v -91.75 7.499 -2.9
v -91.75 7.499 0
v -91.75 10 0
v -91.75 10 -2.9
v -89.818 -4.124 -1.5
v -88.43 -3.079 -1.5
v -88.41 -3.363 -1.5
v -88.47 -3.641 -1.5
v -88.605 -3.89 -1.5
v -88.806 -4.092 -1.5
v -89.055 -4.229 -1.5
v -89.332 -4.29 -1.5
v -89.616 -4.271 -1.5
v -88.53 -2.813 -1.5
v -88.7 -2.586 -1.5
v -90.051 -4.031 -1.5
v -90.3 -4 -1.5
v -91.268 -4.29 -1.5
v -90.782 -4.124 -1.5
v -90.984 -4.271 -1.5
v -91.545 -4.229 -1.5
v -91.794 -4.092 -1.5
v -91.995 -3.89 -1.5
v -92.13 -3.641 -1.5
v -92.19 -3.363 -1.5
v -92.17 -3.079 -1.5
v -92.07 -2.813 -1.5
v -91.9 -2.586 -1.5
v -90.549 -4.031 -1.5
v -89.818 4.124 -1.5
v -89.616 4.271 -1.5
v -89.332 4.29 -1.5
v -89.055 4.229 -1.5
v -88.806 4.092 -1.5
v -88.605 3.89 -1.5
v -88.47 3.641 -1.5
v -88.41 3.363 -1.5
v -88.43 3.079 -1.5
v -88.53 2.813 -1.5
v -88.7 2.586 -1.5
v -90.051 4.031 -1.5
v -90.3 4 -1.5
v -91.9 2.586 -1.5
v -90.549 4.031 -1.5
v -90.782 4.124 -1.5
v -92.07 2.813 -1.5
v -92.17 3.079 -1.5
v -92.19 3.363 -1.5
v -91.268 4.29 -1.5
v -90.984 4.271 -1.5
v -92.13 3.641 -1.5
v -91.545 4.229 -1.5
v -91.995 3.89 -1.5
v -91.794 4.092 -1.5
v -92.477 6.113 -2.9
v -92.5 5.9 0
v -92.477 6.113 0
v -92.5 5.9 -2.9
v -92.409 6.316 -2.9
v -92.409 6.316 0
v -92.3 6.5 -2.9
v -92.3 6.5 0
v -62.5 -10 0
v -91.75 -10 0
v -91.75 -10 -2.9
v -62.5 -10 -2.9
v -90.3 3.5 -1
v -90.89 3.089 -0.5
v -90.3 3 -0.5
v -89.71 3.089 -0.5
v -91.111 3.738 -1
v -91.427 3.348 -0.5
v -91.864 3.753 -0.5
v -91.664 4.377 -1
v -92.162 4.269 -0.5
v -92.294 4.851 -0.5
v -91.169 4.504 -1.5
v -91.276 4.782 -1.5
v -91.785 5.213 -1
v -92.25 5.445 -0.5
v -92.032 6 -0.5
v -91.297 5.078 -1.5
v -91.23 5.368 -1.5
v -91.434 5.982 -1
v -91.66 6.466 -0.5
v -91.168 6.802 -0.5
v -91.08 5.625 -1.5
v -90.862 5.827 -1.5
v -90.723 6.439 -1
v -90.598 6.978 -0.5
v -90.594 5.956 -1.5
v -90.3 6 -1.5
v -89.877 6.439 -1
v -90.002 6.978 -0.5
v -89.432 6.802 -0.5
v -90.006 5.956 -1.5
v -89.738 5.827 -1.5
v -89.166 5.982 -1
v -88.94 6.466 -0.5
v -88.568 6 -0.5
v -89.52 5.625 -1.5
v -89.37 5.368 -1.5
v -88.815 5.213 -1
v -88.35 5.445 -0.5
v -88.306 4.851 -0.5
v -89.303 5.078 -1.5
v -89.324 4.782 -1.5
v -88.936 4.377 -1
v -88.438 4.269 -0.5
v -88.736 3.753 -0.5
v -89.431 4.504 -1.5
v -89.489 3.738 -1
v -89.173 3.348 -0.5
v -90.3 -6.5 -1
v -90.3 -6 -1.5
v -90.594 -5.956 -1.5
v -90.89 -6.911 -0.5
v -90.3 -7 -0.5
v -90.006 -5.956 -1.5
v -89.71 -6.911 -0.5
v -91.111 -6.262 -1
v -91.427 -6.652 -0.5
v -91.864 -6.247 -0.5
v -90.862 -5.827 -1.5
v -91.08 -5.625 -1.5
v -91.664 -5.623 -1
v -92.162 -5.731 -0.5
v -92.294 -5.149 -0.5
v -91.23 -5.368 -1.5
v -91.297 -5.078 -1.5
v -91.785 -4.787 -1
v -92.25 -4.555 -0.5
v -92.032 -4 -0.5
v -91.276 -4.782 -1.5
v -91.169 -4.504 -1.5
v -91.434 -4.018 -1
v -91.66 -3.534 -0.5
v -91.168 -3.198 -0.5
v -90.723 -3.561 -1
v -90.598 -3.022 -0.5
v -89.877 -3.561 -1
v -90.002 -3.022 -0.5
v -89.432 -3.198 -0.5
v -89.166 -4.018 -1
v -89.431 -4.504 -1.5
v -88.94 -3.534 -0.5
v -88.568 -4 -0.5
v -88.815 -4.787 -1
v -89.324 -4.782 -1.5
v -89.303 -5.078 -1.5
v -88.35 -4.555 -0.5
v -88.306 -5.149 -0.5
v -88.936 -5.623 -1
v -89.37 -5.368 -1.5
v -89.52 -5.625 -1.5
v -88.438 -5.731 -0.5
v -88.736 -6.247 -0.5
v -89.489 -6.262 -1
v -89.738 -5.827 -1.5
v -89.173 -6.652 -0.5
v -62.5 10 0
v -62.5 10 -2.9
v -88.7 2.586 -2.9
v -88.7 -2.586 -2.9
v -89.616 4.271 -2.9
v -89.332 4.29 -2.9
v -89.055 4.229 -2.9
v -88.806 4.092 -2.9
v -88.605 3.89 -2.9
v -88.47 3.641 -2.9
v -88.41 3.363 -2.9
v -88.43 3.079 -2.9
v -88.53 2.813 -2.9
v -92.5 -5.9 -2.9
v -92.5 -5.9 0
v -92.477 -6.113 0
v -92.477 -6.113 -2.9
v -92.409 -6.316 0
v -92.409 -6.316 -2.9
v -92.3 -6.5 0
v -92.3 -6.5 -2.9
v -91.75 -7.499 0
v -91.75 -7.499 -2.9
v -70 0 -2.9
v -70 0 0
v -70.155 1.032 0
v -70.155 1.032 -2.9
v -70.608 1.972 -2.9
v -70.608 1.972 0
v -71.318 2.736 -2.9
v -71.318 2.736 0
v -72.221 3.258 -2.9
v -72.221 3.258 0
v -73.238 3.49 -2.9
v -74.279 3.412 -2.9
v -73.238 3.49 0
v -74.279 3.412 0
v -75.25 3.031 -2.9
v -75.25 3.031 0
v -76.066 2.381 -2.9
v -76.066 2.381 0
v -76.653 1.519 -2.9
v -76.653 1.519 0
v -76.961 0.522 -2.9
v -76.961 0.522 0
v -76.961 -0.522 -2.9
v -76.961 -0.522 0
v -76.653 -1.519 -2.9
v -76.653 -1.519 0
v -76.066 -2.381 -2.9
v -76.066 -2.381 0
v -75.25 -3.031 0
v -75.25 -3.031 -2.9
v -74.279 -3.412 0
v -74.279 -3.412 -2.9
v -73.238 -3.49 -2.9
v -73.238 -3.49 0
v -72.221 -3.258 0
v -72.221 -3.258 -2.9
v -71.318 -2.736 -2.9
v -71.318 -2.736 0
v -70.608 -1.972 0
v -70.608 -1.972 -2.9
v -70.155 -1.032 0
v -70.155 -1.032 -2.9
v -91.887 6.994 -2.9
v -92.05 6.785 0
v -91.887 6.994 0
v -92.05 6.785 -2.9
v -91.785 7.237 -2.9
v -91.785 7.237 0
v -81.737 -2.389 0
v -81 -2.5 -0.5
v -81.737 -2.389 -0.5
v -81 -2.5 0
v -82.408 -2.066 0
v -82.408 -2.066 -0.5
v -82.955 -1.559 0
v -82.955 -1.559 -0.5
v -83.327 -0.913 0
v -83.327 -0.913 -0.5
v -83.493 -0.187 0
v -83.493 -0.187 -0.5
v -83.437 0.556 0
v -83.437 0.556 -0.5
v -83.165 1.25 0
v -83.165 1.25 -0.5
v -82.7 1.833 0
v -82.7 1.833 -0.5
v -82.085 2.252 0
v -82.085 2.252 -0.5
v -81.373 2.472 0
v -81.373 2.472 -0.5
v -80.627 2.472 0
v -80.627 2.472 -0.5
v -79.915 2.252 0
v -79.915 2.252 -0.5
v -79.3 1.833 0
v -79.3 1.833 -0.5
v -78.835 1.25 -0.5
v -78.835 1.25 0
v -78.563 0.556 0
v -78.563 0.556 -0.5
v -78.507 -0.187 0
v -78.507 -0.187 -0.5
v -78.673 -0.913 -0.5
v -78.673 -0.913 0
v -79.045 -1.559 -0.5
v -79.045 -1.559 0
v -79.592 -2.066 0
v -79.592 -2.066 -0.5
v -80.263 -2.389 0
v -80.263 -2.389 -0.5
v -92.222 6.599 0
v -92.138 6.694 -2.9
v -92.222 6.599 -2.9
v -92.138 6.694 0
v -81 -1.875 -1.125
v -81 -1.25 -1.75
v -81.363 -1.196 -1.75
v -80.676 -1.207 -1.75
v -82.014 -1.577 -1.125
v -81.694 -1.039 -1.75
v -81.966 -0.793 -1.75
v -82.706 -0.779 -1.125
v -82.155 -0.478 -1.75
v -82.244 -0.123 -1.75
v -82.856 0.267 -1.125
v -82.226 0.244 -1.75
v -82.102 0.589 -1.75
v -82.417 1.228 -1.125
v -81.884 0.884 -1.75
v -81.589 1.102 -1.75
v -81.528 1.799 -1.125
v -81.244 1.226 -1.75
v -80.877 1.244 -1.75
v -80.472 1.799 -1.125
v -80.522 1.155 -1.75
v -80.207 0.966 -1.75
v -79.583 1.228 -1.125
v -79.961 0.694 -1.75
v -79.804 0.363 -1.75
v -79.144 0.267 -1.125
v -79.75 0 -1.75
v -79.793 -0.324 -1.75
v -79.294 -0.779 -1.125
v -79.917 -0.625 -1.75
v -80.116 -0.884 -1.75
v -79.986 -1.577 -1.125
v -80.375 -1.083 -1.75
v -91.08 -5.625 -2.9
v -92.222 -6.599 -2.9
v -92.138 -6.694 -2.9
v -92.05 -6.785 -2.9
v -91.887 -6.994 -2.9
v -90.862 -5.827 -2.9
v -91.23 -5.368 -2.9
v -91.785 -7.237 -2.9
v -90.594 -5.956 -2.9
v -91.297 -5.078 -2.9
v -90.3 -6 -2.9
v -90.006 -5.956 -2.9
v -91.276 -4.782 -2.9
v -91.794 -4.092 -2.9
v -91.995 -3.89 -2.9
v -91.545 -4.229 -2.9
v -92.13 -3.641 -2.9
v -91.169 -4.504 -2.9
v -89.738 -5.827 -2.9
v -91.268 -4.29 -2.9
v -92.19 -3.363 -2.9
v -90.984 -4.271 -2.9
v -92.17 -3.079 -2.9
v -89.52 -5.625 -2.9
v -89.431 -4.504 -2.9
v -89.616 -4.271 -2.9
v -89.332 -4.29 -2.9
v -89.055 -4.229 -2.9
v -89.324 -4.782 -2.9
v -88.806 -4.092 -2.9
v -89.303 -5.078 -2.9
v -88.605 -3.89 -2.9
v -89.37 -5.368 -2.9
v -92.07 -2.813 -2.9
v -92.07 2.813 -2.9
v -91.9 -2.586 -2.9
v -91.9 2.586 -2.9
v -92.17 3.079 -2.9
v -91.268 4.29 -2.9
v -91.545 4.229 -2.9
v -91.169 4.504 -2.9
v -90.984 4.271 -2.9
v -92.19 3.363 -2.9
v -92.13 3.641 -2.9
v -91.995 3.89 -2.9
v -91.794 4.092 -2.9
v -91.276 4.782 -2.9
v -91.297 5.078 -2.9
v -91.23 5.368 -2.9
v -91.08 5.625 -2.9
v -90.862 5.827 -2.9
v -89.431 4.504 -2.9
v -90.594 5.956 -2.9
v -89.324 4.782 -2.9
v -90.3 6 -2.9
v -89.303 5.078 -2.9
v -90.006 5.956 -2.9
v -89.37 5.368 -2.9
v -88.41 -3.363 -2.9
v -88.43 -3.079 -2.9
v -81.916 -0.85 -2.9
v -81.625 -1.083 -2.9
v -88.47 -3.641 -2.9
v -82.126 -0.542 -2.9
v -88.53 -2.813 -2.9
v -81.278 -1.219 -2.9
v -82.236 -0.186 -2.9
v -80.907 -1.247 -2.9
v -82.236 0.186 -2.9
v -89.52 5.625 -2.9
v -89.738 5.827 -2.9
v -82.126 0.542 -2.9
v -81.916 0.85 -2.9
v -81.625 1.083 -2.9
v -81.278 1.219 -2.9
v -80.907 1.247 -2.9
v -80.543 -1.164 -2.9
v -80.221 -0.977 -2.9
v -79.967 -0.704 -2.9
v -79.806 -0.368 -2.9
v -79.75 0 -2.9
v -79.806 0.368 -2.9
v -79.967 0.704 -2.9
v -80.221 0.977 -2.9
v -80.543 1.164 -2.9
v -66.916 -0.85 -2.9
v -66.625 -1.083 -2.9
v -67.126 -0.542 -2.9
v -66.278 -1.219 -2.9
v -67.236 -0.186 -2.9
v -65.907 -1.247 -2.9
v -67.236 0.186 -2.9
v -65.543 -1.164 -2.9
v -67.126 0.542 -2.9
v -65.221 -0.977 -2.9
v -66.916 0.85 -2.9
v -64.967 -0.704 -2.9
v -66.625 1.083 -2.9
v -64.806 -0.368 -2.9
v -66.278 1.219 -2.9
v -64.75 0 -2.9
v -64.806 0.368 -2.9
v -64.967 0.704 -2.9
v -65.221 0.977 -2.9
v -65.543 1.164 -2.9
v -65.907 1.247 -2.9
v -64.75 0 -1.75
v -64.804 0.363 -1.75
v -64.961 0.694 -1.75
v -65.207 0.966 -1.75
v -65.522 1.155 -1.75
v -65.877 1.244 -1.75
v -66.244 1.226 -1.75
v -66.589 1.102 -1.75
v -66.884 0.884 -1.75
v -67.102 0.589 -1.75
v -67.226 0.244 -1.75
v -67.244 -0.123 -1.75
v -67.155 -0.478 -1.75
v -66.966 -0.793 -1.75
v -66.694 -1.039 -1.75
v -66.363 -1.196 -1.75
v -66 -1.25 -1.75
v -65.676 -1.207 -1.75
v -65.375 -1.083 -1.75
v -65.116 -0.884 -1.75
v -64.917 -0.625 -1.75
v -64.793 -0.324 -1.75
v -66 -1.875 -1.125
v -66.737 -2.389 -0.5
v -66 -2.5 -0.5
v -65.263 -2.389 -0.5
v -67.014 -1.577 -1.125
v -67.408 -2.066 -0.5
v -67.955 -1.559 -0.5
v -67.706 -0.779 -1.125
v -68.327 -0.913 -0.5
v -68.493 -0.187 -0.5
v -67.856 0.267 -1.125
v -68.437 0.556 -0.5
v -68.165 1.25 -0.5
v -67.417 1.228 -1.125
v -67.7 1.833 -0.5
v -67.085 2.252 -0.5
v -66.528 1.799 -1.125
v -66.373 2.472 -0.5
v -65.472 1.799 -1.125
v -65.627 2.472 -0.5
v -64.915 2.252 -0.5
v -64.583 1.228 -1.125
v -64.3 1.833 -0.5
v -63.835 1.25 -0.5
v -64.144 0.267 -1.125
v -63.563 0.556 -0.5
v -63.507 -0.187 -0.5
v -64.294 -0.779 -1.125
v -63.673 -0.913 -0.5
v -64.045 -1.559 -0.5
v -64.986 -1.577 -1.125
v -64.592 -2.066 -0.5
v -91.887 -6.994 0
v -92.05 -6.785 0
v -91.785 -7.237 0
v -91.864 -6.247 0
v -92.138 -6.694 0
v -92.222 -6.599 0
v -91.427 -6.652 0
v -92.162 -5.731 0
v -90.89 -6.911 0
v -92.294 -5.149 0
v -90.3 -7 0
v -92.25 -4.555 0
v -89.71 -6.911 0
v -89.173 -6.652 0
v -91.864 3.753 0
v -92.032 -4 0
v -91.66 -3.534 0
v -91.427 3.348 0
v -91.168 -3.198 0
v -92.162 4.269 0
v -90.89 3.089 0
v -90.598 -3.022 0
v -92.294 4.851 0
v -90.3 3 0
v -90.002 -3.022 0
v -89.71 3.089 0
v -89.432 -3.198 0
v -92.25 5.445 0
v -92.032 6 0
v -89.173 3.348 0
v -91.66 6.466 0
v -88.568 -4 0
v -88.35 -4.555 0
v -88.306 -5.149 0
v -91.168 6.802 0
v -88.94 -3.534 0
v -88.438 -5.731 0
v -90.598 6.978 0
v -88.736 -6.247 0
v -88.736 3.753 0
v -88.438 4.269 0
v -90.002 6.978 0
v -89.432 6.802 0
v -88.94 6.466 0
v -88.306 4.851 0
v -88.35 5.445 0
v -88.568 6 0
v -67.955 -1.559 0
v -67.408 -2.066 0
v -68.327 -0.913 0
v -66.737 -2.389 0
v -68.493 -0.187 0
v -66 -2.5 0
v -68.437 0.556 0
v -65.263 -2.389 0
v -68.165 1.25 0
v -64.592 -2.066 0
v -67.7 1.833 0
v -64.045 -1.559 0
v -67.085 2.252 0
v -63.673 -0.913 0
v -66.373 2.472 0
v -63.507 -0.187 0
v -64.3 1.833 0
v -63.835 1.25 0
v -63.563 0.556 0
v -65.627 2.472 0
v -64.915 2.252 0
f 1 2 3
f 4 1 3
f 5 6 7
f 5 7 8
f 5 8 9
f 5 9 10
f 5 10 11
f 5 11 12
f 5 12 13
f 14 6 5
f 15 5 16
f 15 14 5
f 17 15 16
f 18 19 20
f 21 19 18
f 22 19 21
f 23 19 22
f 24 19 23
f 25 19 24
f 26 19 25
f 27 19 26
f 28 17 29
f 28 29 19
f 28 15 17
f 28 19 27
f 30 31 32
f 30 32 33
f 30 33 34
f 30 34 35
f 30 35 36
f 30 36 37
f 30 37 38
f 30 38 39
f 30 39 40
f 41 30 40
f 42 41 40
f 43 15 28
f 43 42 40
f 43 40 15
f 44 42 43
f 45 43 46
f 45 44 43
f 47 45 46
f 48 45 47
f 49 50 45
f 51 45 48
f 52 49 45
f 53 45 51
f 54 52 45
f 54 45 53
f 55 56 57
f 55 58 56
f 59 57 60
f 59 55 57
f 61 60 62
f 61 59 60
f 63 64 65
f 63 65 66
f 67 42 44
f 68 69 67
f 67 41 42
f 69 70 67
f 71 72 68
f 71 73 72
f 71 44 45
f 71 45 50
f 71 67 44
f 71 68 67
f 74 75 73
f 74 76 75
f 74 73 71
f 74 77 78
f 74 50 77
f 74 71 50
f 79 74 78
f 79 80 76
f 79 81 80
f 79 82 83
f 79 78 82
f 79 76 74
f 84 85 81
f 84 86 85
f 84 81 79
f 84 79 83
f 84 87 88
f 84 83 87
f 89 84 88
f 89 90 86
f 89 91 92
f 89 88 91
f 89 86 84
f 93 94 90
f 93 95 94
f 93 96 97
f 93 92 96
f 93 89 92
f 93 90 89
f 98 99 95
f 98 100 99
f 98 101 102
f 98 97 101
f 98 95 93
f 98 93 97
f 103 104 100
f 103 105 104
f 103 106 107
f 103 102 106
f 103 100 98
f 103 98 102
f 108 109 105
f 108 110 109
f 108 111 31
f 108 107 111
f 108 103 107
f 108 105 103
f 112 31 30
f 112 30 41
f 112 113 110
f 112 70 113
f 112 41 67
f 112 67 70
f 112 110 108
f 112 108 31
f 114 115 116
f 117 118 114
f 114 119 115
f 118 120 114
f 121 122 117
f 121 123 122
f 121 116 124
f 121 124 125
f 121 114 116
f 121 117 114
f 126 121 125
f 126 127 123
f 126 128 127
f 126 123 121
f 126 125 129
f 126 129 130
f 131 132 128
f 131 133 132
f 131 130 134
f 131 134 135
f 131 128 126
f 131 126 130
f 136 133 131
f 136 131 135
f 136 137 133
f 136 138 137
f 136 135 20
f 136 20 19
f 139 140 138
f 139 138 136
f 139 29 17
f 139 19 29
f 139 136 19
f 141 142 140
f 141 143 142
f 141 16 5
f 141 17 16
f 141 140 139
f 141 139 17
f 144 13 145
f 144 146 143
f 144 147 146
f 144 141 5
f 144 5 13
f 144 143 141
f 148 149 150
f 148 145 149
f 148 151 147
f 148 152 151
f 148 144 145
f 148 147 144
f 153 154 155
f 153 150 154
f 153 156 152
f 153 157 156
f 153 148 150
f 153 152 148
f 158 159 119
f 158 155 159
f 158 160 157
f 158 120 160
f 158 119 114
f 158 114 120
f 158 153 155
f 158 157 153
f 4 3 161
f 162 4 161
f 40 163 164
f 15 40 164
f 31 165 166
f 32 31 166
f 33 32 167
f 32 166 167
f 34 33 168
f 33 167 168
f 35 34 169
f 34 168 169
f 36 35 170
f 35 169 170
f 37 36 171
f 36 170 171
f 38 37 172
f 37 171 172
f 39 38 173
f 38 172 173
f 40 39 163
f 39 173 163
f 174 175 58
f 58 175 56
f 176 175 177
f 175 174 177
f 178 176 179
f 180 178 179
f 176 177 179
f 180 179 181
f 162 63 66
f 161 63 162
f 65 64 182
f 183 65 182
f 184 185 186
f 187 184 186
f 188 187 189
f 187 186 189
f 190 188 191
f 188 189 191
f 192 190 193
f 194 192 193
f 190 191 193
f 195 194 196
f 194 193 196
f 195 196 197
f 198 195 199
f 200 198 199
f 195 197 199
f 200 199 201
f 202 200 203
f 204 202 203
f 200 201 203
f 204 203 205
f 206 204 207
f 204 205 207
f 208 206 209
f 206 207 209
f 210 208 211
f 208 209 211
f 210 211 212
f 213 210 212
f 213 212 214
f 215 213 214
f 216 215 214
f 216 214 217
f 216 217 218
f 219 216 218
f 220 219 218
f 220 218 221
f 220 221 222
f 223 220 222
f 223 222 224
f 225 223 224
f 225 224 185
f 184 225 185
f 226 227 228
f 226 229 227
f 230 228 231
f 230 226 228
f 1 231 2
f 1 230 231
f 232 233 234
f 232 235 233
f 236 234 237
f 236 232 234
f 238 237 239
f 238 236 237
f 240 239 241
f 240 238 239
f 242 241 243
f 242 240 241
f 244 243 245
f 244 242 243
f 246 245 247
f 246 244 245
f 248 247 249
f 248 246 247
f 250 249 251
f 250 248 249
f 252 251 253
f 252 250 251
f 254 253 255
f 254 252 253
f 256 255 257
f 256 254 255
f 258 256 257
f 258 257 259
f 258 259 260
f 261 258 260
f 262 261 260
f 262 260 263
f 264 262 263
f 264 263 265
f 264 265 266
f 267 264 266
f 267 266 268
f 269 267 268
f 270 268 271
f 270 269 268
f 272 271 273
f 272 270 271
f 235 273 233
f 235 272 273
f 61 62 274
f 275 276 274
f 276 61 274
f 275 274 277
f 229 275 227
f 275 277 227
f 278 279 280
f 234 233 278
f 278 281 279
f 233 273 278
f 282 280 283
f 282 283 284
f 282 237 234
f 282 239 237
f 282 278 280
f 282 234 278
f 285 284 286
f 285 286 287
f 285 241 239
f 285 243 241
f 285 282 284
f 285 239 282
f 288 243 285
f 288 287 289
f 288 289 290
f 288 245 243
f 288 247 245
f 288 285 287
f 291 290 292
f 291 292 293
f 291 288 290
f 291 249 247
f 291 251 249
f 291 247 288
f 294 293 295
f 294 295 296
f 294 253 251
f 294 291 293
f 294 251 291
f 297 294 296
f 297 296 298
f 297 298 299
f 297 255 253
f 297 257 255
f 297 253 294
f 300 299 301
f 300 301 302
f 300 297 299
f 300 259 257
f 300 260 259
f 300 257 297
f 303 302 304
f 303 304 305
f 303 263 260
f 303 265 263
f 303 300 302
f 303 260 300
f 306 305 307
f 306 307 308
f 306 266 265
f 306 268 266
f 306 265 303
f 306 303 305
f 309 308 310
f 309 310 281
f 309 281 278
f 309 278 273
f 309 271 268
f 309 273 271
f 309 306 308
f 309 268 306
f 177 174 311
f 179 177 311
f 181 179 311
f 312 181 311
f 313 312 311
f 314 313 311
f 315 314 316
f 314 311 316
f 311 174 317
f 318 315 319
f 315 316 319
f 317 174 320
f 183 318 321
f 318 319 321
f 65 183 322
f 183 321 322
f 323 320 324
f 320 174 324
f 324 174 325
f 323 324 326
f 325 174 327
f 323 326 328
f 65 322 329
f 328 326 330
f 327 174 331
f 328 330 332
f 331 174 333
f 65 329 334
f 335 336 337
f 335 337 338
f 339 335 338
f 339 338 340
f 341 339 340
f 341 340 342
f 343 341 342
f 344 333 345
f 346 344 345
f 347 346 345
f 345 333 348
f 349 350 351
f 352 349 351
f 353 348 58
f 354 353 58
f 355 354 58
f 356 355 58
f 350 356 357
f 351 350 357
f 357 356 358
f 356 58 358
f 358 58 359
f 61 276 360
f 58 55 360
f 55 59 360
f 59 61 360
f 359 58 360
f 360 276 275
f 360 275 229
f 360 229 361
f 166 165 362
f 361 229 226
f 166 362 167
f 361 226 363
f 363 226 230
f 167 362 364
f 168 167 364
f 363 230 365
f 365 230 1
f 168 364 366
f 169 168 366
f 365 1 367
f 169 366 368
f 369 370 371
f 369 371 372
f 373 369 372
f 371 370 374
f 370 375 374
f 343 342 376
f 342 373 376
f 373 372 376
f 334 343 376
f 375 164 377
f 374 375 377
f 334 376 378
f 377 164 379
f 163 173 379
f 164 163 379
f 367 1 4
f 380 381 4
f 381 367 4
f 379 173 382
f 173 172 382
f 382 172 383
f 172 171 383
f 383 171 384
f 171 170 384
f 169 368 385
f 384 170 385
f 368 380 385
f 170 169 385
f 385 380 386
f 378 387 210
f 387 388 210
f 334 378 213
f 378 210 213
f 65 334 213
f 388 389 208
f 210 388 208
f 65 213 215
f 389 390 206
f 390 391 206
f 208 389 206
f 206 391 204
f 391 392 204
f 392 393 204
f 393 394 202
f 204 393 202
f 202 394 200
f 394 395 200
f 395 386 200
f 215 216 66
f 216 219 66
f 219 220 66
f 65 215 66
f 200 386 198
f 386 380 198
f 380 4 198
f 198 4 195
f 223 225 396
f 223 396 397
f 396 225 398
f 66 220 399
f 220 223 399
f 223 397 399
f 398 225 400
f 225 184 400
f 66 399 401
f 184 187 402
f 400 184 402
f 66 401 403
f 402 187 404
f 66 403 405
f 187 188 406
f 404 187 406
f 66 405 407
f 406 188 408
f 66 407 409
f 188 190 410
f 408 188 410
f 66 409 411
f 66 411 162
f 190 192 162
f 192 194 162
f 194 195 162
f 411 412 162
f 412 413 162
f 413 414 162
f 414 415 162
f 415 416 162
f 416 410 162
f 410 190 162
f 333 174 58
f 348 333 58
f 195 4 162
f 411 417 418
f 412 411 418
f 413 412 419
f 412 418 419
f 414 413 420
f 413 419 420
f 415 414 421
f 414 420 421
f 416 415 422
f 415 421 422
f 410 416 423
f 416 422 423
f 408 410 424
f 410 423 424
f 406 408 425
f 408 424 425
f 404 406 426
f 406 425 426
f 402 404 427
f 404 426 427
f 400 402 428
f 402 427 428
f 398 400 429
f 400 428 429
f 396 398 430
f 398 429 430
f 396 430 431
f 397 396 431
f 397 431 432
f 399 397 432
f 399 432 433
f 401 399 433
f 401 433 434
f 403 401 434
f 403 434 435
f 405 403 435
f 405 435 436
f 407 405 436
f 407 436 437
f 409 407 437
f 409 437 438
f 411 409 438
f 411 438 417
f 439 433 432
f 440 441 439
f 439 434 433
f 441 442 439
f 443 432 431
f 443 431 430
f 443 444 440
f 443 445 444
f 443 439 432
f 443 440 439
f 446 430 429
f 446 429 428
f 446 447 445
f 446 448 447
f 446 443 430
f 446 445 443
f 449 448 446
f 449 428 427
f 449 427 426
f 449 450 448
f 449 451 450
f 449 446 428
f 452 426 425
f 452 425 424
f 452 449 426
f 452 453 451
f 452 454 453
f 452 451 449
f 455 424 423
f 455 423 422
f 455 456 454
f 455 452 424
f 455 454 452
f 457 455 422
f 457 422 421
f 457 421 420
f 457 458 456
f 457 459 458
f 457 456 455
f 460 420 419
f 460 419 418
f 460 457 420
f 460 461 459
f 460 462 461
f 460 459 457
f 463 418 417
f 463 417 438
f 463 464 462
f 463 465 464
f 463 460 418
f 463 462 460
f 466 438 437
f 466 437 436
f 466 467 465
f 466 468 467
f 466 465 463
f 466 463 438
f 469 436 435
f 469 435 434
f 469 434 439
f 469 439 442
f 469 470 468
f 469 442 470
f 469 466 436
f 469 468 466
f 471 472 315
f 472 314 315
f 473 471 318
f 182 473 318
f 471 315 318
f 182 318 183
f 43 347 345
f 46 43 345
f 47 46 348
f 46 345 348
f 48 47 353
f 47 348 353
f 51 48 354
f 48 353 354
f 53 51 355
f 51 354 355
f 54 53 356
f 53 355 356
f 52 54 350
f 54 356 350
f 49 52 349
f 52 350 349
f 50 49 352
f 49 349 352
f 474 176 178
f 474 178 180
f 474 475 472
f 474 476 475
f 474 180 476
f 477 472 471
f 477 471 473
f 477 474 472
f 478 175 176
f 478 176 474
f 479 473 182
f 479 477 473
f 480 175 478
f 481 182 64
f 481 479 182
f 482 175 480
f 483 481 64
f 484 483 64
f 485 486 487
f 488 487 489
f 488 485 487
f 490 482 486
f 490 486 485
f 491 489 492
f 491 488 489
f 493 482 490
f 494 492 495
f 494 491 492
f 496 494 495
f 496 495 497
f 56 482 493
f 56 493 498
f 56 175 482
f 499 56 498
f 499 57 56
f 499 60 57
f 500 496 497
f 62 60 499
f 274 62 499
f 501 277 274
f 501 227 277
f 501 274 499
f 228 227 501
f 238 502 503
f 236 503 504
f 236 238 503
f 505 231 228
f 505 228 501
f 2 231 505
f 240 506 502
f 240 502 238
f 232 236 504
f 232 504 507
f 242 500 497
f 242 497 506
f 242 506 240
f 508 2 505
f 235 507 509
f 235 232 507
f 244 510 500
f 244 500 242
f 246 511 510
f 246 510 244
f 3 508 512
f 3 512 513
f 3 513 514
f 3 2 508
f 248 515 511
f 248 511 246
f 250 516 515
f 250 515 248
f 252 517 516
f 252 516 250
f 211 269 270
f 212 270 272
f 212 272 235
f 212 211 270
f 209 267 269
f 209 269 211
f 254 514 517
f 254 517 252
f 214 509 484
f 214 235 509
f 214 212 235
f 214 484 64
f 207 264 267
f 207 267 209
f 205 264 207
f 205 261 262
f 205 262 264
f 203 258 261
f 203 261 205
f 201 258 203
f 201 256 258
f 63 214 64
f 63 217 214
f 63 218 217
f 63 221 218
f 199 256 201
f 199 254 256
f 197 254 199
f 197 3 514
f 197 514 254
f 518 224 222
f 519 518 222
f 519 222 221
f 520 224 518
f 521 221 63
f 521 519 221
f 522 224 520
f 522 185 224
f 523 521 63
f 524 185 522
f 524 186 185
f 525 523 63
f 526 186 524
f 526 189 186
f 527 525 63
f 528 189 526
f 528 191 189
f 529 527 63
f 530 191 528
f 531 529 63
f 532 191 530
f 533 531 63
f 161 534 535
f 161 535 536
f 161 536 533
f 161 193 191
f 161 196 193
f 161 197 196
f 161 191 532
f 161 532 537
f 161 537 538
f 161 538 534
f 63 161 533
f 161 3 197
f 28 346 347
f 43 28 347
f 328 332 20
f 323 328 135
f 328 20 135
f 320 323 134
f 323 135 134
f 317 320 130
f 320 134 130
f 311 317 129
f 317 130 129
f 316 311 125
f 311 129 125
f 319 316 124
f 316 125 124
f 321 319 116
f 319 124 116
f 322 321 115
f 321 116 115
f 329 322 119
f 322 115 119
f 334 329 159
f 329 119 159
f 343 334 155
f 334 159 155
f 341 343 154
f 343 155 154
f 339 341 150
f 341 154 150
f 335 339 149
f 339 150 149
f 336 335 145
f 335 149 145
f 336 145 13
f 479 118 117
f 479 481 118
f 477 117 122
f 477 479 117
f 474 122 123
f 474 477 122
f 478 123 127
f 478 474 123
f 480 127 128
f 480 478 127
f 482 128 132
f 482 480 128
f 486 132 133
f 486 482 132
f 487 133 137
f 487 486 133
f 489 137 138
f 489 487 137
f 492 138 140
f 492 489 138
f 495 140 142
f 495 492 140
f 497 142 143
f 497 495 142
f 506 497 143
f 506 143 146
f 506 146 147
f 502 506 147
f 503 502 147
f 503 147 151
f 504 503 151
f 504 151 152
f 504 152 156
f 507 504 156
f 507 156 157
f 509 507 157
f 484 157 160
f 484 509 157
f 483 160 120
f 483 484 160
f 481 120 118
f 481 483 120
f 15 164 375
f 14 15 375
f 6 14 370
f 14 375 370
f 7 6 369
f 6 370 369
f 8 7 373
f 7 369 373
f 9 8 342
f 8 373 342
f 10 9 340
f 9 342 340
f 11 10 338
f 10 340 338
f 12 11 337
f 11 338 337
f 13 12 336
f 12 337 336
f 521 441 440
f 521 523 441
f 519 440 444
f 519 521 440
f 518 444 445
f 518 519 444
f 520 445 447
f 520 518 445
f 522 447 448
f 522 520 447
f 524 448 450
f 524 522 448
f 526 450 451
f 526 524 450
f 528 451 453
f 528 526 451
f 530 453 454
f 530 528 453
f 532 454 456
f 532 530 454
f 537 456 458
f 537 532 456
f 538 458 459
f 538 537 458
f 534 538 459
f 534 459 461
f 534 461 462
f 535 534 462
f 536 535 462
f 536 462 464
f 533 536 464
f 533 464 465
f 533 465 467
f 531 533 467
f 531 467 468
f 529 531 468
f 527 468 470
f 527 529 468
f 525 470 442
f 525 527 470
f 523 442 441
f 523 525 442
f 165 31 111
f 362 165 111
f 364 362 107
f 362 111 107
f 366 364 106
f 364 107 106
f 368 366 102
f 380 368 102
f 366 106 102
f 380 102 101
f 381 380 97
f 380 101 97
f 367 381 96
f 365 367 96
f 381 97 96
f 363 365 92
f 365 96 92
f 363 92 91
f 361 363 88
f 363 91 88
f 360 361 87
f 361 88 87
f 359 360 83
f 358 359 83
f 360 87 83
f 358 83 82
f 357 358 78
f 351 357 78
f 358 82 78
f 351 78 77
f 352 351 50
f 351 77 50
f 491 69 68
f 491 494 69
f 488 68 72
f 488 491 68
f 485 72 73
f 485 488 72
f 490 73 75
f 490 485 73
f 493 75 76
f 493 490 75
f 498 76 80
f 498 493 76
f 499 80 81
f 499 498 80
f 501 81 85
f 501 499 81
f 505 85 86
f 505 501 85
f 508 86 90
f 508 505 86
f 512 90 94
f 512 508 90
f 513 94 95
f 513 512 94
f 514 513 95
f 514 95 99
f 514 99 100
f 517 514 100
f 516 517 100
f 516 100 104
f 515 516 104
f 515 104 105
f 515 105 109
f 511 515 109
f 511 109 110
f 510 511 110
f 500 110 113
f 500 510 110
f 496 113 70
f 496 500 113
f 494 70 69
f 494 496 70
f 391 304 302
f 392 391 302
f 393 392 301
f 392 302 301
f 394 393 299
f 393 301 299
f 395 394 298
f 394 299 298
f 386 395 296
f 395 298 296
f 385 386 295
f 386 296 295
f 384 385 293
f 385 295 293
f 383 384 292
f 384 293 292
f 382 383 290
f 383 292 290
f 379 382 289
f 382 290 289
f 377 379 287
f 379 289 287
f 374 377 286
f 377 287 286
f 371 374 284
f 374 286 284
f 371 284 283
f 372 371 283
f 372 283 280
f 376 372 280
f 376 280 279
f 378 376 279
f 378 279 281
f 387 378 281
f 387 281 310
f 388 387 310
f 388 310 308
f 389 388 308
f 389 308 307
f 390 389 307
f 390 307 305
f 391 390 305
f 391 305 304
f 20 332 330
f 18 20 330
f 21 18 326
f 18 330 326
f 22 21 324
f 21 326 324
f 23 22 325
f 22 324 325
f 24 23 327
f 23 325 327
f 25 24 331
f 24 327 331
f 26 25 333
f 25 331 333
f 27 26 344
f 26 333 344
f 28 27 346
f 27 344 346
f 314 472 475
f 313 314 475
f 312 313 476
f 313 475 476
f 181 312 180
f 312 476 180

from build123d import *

# Parameters (mm, degrees)
SKETCH1_W                                      = 185
SKETCH1_H                                      = 20
BASE_SHAPE_DEPTH                               = 2.9
MOTOR_CUTOUTS_REACH                            = 95.084
SKETCH2_R                                      = 1.25
SKETCH2_R_2                                    = 3.5
SKETCH2_R_3                                    = 5
MOTOR_M2_5_COUNTERSUNKS_AT_2_COUNT             = 2
MOTOR_M2_5_COUNTERSUNKS_AT_2_PITCH             = 15
MOTOR_M2_5_COUNTERSUNKS_AT_3_COUNT             = 2
MOTOR_M2_5_COUNTERSUNKS_AT_3_PITCH             = 147.666008275
MOTOR_M2_5_COUNTERSUNKS_AT_4_COUNT             = 2
MOTOR_M2_5_COUNTERSUNKS_AT_4_PITCH             = 161.651631603
MOTOR_M2_5_COUNTERSUNKS_AT_5_COUNT             = 2
MOTOR_M2_5_COUNTERSUNKS_AT_5_PITCH             = 147.666008275
MOTOR_M2_5_COUNTERSUNKS_AT_6_COUNT             = 2
MOTOR_M2_5_COUNTERSUNKS_AT_6_PITCH             = 161.651631603
PCB_SLOT_DEPTH                                 = 0.775
END_PLATE_HOLES_REACH                          = 95.084
SKETCH6_R                                      = 1
CSK_FOR_M2_FLAT_HEAD_MACHINE_SCREW3_AT_2_COUNT = 2
CSK_FOR_M2_FLAT_HEAD_MACHINE_SCREW3_AT_2_PITCH = 10
CSK_FOR_M2_FLAT_HEAD_MACHINE_SCREW3_AT_3_COUNT = 2
CSK_FOR_M2_FLAT_HEAD_MACHINE_SCREW3_AT_3_PITCH = 180.6
CSK_FOR_M2_FLAT_HEAD_MACHINE_SCREW3_AT_4_COUNT = 2
CSK_FOR_M2_FLAT_HEAD_MACHINE_SCREW3_AT_4_PITCH = 180.876643047
TAP_SLOTS_DEPTH                                = 1.4
CUT_EXTRUDE3_REACH                             = 95.084
FILLET1_R                                      = 1
CUT_EXTRUDE4_REACH                             = 95.084
SKETCH14_W                                     = 155
SKETCH14_H                                     = 20


with BuildPart() as part:
    # Sketch1 → Base shape (new body)
    with BuildSketch(Plane.XY):
        Rectangle(SKETCH1_W, SKETCH1_H)
    extrude(amount=-BASE_SHAPE_DEPTH)

    # Sketch2 → Motor cutouts (cut, up to next)
    with BuildSketch(Plane.XY, mode=Mode.PRIVATE) as motor_cutouts_sk1:
        with Locations((-81, 0)):
            Circle(SKETCH2_R)
    motor_cutouts_tool1 = extrude(motor_cutouts_sk1.sketch, amount=-MOTOR_CUTOUTS_REACH, mode=Mode.PRIVATE) & part.part
    # Sketch2 → Motor cutouts (cut, up to next)
    with BuildSketch(Plane.XY, mode=Mode.PRIVATE) as motor_cutouts_sk2:
        with Locations((-66, 0)):
            Circle(SKETCH2_R)
    motor_cutouts_tool2 = extrude(motor_cutouts_sk2.sketch, amount=-MOTOR_CUTOUTS_REACH, mode=Mode.PRIVATE) & part.part
    # Sketch2 → Motor cutouts (cut, up to next)
    with BuildSketch(Plane.XY, mode=Mode.PRIVATE) as motor_cutouts_sk3:
        with Locations((-73.5, 0)):
            Circle(SKETCH2_R_2)
    motor_cutouts_tool3 = extrude(motor_cutouts_sk3.sketch, amount=-MOTOR_CUTOUTS_REACH, mode=Mode.PRIVATE) & part.part
    # Sketch2 → Motor cutouts (cut, up to next)
    with BuildSketch(Plane.XY, mode=Mode.PRIVATE) as motor_cutouts_sk4:
        with Locations((73.5, 0)):
            Circle(SKETCH2_R_3)
    motor_cutouts_tool4 = extrude(motor_cutouts_sk4.sketch, amount=-MOTOR_CUTOUTS_REACH, mode=Mode.PRIVATE) & part.part
    # Sketch2 → Motor cutouts (cut, up to next)
    with BuildSketch(Plane.XY, mode=Mode.PRIVATE) as motor_cutouts_sk5:
        with Locations((66.5, 7)):
            Circle(SKETCH2_R)
    motor_cutouts_tool5 = extrude(motor_cutouts_sk5.sketch, amount=-MOTOR_CUTOUTS_REACH, mode=Mode.PRIVATE) & part.part
    # Sketch2 → Motor cutouts (cut, up to next)
    with BuildSketch(Plane.XY, mode=Mode.PRIVATE) as motor_cutouts_sk6:
        with Locations((80.5, 7)):
            Circle(SKETCH2_R)
    motor_cutouts_tool6 = extrude(motor_cutouts_sk6.sketch, amount=-MOTOR_CUTOUTS_REACH, mode=Mode.PRIVATE) & part.part
    # Sketch2 → Motor cutouts (cut, up to next)
    with BuildSketch(Plane.XY, mode=Mode.PRIVATE) as motor_cutouts_sk7:
        with Locations((80.5, -7)):
            Circle(SKETCH2_R)
    motor_cutouts_tool7 = extrude(motor_cutouts_sk7.sketch, amount=-MOTOR_CUTOUTS_REACH, mode=Mode.PRIVATE) & part.part
    # Sketch2 → Motor cutouts (cut, up to next)
    with BuildSketch(Plane.XY, mode=Mode.PRIVATE) as motor_cutouts_sk8:
        with Locations((66.5, -7)):
            Circle(SKETCH2_R)
    motor_cutouts_tool8 = extrude(motor_cutouts_sk8.sketch, amount=-MOTOR_CUTOUTS_REACH, mode=Mode.PRIVATE) & part.part
    add(motor_cutouts_tool1.solids().sort_by_distance((-81, 0, 0))[0], mode=Mode.SUBTRACT)
    add(motor_cutouts_tool2.solids().sort_by_distance((-66, 0, 0))[0], mode=Mode.SUBTRACT)
    add(motor_cutouts_tool3.solids().sort_by_distance((-73.5, 0, 0))[0], mode=Mode.SUBTRACT)
    add(motor_cutouts_tool4.solids().sort_by_distance((73.5, 0, 0))[0], mode=Mode.SUBTRACT)
    add(motor_cutouts_tool5.solids().sort_by_distance((66.5, 7, 0))[0], mode=Mode.SUBTRACT)
    add(motor_cutouts_tool6.solids().sort_by_distance((80.5, 7, 0))[0], mode=Mode.SUBTRACT)
    add(motor_cutouts_tool7.solids().sort_by_distance((80.5, -7, 0))[0], mode=Mode.SUBTRACT)
    add(motor_cutouts_tool8.solids().sort_by_distance((66.5, -7, 0))[0], mode=Mode.SUBTRACT)

    # Sketch4 → Motor M2.5 countersunks (revolve, cut)
    with BuildSketch(Plane(origin=(-81, 0, 0), x_dir=(0, -1, 0), z_dir=(1, 0, 0))):
        Polygon((0, 0), (0, 2.9), (1.25, 2.9), (1.25, 1.75), (2.5, 0.5), (2.5, 0), align=None)
    motor_m2_5_countersunks = revolve(axis=Axis((-81, 0, 6.35), (0, 0, -1)), mode=Mode.SUBTRACT)

    # Motor M2.5 countersunks at 2: Motor M2.5 countersunks ×2
    with Locations(*[(i * MOTOR_M2_5_COUNTERSUNKS_AT_2_PITCH, 0, 0) for i in range(1, MOTOR_M2_5_COUNTERSUNKS_AT_2_COUNT)]):
        add(motor_m2_5_countersunks, mode=Mode.SUBTRACT)

    # Motor M2.5 countersunks at 3: Motor M2.5 countersunks ×2
    with Locations(*[Vector(0.9988757854473691, 0.047404274563603965, 0) * (i * MOTOR_M2_5_COUNTERSUNKS_AT_3_PITCH) for i in range(1, MOTOR_M2_5_COUNTERSUNKS_AT_3_COUNT)]):
        add(motor_m2_5_countersunks, mode=Mode.SUBTRACT)

    # Motor M2.5 countersunks at 4: Motor M2.5 countersunks ×2
    with Locations(*[Vector(0.9990619853213468, 0.043302996267798335, 0) * (i * MOTOR_M2_5_COUNTERSUNKS_AT_4_PITCH) for i in range(1, MOTOR_M2_5_COUNTERSUNKS_AT_4_COUNT)]):
        add(motor_m2_5_countersunks, mode=Mode.SUBTRACT)

    # Motor M2.5 countersunks at 5: Motor M2.5 countersunks ×2
    with Locations(*[Vector(0.9988757854473691, -0.04740427456360395, 0) * (i * MOTOR_M2_5_COUNTERSUNKS_AT_5_PITCH) for i in range(1, MOTOR_M2_5_COUNTERSUNKS_AT_5_COUNT)]):
        add(motor_m2_5_countersunks, mode=Mode.SUBTRACT)

    # Motor M2.5 countersunks at 6: Motor M2.5 countersunks ×2
    with Locations(*[Vector(0.9990619853213468, -0.0433029962677983, 0) * (i * MOTOR_M2_5_COUNTERSUNKS_AT_6_PITCH) for i in range(1, MOTOR_M2_5_COUNTERSUNKS_AT_6_COUNT)]):
        add(motor_m2_5_countersunks, mode=Mode.SUBTRACT)

    # Sketch5 → PCB slot (cut)
    with BuildSketch(Plane(origin=(0, 0, -2.9), x_dir=(-1, 0, 0), z_dir=(0, 0, -1))):
        with BuildLine():
            Line((-60, -6), (60, -6))
            ThreePointArc((60, -6), (61, -7), (60, -8))
            Line((60, -8), (-60, -8))
            ThreePointArc((-60, -8), (-61, -7), (-60, -6))
        make_face()
    extrude(amount=-PCB_SLOT_DEPTH, mode=Mode.SUBTRACT)

    # Sketch6 → End plate holes (cut, up to next)
    with BuildSketch(Plane.XY, mode=Mode.PRIVATE) as end_plate_holes_sk1:
        with Locations((90.3, 5)):
            Circle(SKETCH6_R)
    end_plate_holes_tool1 = extrude(end_plate_holes_sk1.sketch, amount=-END_PLATE_HOLES_REACH, mode=Mode.PRIVATE) & part.part
    # Sketch6 → End plate holes (cut, up to next)
    with BuildSketch(Plane.XY, mode=Mode.PRIVATE) as end_plate_holes_sk2:
        with Locations((90.3, -5)):
            Circle(SKETCH6_R)
    end_plate_holes_tool2 = extrude(end_plate_holes_sk2.sketch, amount=-END_PLATE_HOLES_REACH, mode=Mode.PRIVATE) & part.part
    # Sketch6 → End plate holes (cut, up to next)
    with BuildSketch(Plane.XY, mode=Mode.PRIVATE) as end_plate_holes_sk3:
        with Locations((-90.3, -5)):
            Circle(SKETCH6_R)
    end_plate_holes_tool3 = extrude(end_plate_holes_sk3.sketch, amount=-END_PLATE_HOLES_REACH, mode=Mode.PRIVATE) & part.part
    # Sketch6 → End plate holes (cut, up to next)
    with BuildSketch(Plane.XY, mode=Mode.PRIVATE) as end_plate_holes_sk4:
        with Locations((-90.3, 5)):
            Circle(SKETCH6_R)
    end_plate_holes_tool4 = extrude(end_plate_holes_sk4.sketch, amount=-END_PLATE_HOLES_REACH, mode=Mode.PRIVATE) & part.part
    add(end_plate_holes_tool1.solids().sort_by_distance((90.3, 5, 0))[0], mode=Mode.SUBTRACT)
    add(end_plate_holes_tool2.solids().sort_by_distance((90.3, -5, 0))[0], mode=Mode.SUBTRACT)
    add(end_plate_holes_tool3.solids().sort_by_distance((-90.3, -5, 0))[0], mode=Mode.SUBTRACT)
    add(end_plate_holes_tool4.solids().sort_by_distance((-90.3, 5, 0))[0], mode=Mode.SUBTRACT)

    # Sketch9 → CSK for M2 Flat Head Machine Screw3 (revolve, cut)
    with BuildSketch(Plane(origin=(90.3, 5, 0), x_dir=(0, -1, 0), z_dir=(1, 0, 0))):
        Polygon((0, 0), (0, 2.9), (1, 2.9), (1, 1.5), (2, 0.5), (2, 0), align=None)
    csk_for_m2_flat_head_machine_screw3 = revolve(axis=Axis((90.3, 5, 6.35), (0, 0, -1)), mode=Mode.SUBTRACT)

    # CSK for M2 Flat Head Machine Screw3 at 2: CSK for M2 Flat Head Machine Screw3 ×2
    with Locations(*[(0, -i * CSK_FOR_M2_FLAT_HEAD_MACHINE_SCREW3_AT_2_PITCH, 0) for i in range(1, CSK_FOR_M2_FLAT_HEAD_MACHINE_SCREW3_AT_2_COUNT)]):
        add(csk_for_m2_flat_head_machine_screw3, mode=Mode.SUBTRACT)

    # CSK for M2 Flat Head Machine Screw3 at 3: CSK for M2 Flat Head Machine Screw3 ×2
    with Locations(*[(-i * CSK_FOR_M2_FLAT_HEAD_MACHINE_SCREW3_AT_3_PITCH, 0, 0) for i in range(1, CSK_FOR_M2_FLAT_HEAD_MACHINE_SCREW3_AT_3_COUNT)]):
        add(csk_for_m2_flat_head_machine_screw3, mode=Mode.SUBTRACT)

    # CSK for M2 Flat Head Machine Screw3 at 4: CSK for M2 Flat Head Machine Screw3 ×2
    with Locations(*[Vector(-0.9984705430039356, -0.055286298062233535, 0) * (i * CSK_FOR_M2_FLAT_HEAD_MACHINE_SCREW3_AT_4_PITCH) for i in range(1, CSK_FOR_M2_FLAT_HEAD_MACHINE_SCREW3_AT_4_COUNT)]):
        add(csk_for_m2_flat_head_machine_screw3, mode=Mode.SUBTRACT)

    # Sketch12 → Tap slots (cut)
    with BuildSketch(Plane(origin=(0, 0, -2.9), x_dir=(-1, 0, 0), z_dir=(0, 0, -1))):
        with BuildLine():
            ThreePointArc((-90.984432764, 4.270924015), (-92.07157644, 3.770298494), (-91.9, 2.585786438))
            Line((-91.9, 2.585786438), (-91.9, -2.585786438))
            ThreePointArc((-91.9, -2.585786438), (-92.07157644, -3.770298494), (-90.984432764, -4.270924015))
            ThreePointArc((-90.984432764, -4.270924015), (-90.3, -4), (-89.615567236, -4.270924015))
            ThreePointArc((-89.615567236, -4.270924015), (-88.52842356, -3.770298494), (-88.7, -2.585786438))
            Line((-88.7, -2.585786438), (-88.7, 2.585786438))
            ThreePointArc((-88.7, 2.585786438), (-88.52842356, 3.770298494), (-89.615567236, 4.270924015))
            ThreePointArc((-89.615567236, 4.270924015), (-90.3, 4), (-90.984432764, 4.270924015))
        make_face()
        with BuildLine():
            ThreePointArc((90.984432764, -4.270924015), (92.07157644, -3.770298494), (91.9, -2.585786438))
            Line((91.9, -2.585786438), (91.9, 2.585786438))
            ThreePointArc((91.9, 2.585786438), (92.07157644, 3.770298494), (90.984432764, 4.270924015))
            ThreePointArc((90.984432764, 4.270924015), (90.3, 4), (89.615567236, 4.270924015))
            ThreePointArc((89.615567236, 4.270924015), (88.52842356, 3.770298494), (88.7, 2.585786438))
            Line((88.7, 2.585786438), (88.7, -2.585786438))
            ThreePointArc((88.7, -2.585786438), (88.52842356, -3.770298494), (89.615567236, -4.270924015))
            ThreePointArc((89.615567236, -4.270924015), (90.3, -4), (90.984432764, -4.270924015))
        make_face()
    extrude(amount=-TAP_SLOTS_DEPTH, mode=Mode.SUBTRACT)

    # Sketch13 → Cut-Extrude3 (cut, up to next)
    with BuildSketch(Plane.XY, mode=Mode.PRIVATE) as cut_extrude3_sk1:
        with BuildLine():
            Line((-91.75, 10), (-92.5, 10))
            Line((-92.5, 10), (-92.5, 6.187434209))
            ThreePointArc((-92.5, 6.187434209), (-92.173731748, 6.655031521), (-91.75, 7.036541185))
            Line((-91.75, 7.036541185), (-91.75, 10))
        make_face()
    cut_extrude3_tool1 = extrude(cut_extrude3_sk1.sketch, amount=-CUT_EXTRUDE3_REACH, mode=Mode.PRIVATE) & part.part
    # Sketch13 → Cut-Extrude3 (cut, up to next)
    with BuildSketch(Plane.XY, mode=Mode.PRIVATE) as cut_extrude3_sk2:
        with BuildLine():
            ThreePointArc((-91.75, -7.036541185), (-92.173731748, -6.655031521), (-92.5, -6.187434209))
            Line((-92.5, -6.187434209), (-92.5, -10))
            Line((-92.5, -10), (-91.75, -10))
            Line((-91.75, -10), (-91.75, -7.036541185))
        make_face()
    cut_extrude3_tool2 = extrude(cut_extrude3_sk2.sketch, amount=-CUT_EXTRUDE3_REACH, mode=Mode.PRIVATE) & part.part
    # Sketch13 → Cut-Extrude3 (cut, up to next)
    with BuildSketch(Plane.XY, mode=Mode.PRIVATE) as cut_extrude3_sk3:
        with BuildLine():
            Line((92.5, 10), (91.75, 10))
            Line((91.75, 10), (91.75, 7.036541185))
            ThreePointArc((91.75, 7.036541185), (92.173731748, 6.655031521), (92.5, 6.187434209))
            Line((92.5, 6.187434209), (92.5, 10))
        make_face()
    cut_extrude3_tool3 = extrude(cut_extrude3_sk3.sketch, amount=-CUT_EXTRUDE3_REACH, mode=Mode.PRIVATE) & part.part
    # Sketch13 → Cut-Extrude3 (cut, up to next)
    with BuildSketch(Plane.XY, mode=Mode.PRIVATE) as cut_extrude3_sk4:
        with BuildLine():
            ThreePointArc((92.5, -6.187434209), (92.173731748, -6.655031521), (91.75, -7.036541185))
            Line((91.75, -7.036541185), (91.75, -10))
            Line((91.75, -10), (92.5, -10))
            Line((92.5, -10), (92.5, -6.187434209))
        make_face()
    cut_extrude3_tool4 = extrude(cut_extrude3_sk4.sketch, amount=-CUT_EXTRUDE3_REACH, mode=Mode.PRIVATE) & part.part
    add(cut_extrude3_tool1.solids().sort_by_distance((-92.140588, 8.330084, 0))[0], mode=Mode.SUBTRACT)
    add(cut_extrude3_tool2.solids().sort_by_distance((-92.140588, -8.330084, 0))[0], mode=Mode.SUBTRACT)
    add(cut_extrude3_tool3.solids().sort_by_distance((92.140588, 8.330084, 0))[0], mode=Mode.SUBTRACT)
    add(cut_extrude3_tool4.solids().sort_by_distance((92.140588, -8.330084, 0))[0], mode=Mode.SUBTRACT)

    # Fillet1
    fillet1_edges = [part.edges().sort_by_distance(p)[0] for p in [
        (-91.75, 7.036541185, -1.45),
        (-92.5, 6.187434209, -1.45),
        (-92.5, -6.187434209, -1.45),
        (-91.75, -7.036541185, -1.45),
        (91.75, 7.036541185, -1.45),
        (92.5, 6.187434209, -1.45),
        (92.5, -6.187434209, -1.45),
        (91.75, -7.036541185, -1.45),
    ]]
    fillet(fillet1_edges, radius=FILLET1_R)

    # Sketch14 → Cut-Extrude4 (cut, up to next)
    with BuildSketch(Plane.XY, mode=Mode.PRIVATE) as cut_extrude4_sk1:
        with Locations((15, 0)):
            Rectangle(SKETCH14_W, SKETCH14_H)
    cut_extrude4_tool1 = extrude(cut_extrude4_sk1.sketch, amount=-CUT_EXTRUDE4_REACH, mode=Mode.PRIVATE) & part.part
    add(cut_extrude4_tool1.solids().sort_by_distance((15, 0, 0))[0], mode=Mode.SUBTRACT)


solid = part.part
